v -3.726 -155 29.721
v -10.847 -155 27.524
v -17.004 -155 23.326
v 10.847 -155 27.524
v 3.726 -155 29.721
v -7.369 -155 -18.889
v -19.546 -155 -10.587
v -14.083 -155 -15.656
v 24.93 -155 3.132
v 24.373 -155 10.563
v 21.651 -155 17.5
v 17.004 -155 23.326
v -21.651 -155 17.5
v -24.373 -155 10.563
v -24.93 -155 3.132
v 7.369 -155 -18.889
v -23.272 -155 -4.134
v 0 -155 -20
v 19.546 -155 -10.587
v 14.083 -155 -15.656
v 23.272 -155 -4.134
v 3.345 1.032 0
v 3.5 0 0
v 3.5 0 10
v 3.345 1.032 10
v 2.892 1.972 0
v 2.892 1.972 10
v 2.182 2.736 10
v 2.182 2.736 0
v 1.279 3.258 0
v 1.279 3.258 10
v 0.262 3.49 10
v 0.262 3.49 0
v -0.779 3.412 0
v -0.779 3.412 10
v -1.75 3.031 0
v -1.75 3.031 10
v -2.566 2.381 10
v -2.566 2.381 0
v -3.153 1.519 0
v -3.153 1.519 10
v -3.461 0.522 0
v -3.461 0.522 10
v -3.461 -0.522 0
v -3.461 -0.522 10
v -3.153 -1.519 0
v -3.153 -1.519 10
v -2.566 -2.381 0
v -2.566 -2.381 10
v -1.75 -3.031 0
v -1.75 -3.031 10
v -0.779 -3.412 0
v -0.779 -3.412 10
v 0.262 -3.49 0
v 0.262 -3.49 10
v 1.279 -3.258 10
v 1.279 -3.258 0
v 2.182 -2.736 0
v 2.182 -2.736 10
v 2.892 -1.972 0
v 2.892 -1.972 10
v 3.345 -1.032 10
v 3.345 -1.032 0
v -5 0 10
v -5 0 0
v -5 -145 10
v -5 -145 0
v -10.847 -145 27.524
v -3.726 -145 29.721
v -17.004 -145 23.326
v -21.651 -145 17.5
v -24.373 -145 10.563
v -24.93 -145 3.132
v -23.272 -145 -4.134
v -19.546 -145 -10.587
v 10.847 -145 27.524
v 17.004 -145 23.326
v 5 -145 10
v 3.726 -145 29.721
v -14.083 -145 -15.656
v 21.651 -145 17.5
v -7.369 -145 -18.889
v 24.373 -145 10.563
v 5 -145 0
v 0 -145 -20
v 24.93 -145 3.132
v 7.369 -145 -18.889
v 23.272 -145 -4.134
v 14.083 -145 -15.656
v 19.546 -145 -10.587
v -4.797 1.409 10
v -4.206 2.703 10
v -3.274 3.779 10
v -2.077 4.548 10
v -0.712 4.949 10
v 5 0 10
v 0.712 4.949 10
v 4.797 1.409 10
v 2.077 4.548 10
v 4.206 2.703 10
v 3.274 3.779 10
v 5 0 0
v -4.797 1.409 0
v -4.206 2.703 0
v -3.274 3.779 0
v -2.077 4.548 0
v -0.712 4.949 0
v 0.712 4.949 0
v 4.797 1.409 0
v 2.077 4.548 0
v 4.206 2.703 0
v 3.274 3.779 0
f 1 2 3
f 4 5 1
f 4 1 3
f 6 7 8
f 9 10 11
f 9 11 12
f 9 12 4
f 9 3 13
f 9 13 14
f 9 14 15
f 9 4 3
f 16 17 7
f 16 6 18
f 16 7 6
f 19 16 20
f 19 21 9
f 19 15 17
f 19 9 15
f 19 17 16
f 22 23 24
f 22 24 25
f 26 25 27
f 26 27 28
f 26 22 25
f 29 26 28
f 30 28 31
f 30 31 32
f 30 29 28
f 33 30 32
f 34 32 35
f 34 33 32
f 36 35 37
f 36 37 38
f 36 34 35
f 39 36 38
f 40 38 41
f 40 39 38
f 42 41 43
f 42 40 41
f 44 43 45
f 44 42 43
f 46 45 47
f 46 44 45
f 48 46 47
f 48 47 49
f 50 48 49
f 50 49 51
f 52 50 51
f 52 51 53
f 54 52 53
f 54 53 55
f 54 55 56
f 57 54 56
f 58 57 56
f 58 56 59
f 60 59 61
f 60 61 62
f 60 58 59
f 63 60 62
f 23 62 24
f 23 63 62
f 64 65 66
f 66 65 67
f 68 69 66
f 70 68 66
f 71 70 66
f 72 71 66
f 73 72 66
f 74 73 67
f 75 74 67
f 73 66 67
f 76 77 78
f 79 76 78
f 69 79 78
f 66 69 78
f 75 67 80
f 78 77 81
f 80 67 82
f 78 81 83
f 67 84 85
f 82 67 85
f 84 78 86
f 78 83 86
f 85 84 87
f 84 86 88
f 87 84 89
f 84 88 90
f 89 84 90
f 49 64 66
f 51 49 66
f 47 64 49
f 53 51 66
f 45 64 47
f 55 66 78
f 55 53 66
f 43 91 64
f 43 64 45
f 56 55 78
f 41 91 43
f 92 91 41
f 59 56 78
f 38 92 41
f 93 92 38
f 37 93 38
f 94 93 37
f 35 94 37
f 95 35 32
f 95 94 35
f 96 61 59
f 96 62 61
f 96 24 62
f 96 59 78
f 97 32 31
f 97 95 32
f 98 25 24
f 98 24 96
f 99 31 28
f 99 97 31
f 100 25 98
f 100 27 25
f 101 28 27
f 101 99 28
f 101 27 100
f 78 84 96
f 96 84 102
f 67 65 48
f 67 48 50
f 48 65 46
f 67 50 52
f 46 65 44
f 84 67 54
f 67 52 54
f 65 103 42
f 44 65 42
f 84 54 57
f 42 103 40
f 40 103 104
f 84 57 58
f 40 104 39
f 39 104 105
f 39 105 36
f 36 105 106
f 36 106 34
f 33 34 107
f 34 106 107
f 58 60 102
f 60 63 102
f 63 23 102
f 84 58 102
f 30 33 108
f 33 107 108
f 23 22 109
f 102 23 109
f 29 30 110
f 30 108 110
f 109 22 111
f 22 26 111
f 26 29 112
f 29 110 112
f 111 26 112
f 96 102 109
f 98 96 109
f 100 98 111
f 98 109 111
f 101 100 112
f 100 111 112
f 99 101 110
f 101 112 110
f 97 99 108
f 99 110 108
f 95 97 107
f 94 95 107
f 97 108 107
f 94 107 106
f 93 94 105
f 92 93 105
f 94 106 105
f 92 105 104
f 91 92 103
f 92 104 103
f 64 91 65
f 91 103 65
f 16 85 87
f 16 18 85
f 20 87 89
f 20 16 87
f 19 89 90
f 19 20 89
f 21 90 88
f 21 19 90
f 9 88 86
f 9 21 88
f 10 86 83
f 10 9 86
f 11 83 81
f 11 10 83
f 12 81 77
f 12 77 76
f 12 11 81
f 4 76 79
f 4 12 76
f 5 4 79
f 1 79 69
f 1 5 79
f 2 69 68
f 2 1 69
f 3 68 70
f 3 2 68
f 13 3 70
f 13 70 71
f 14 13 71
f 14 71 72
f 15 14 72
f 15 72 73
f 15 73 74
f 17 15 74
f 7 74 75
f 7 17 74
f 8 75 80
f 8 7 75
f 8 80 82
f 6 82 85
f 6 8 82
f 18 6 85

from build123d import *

# Parameters (mm, degrees)
SKETCH1_R           = 3.5
BOSS_EXTRUDE1_DEPTH = 10
SKETCH2_R           = 25
BOSS_EXTRUDE2_DEPTH = 5


with BuildPart() as part:
    # Sketch1 → Boss-Extrude1 (new body)
    with BuildSketch(Plane.XY):
        with BuildLine():
            Line((-5, 0), (-5, -150))
            Line((-5, -150), (5, -150))
            Line((5, -150), (5, 0))
            ThreePointArc((5, 0), (0, 5), (-5, 0))
        make_face()
        Circle(SKETCH1_R, mode=Mode.SUBTRACT)
    extrude(amount=BOSS_EXTRUDE1_DEPTH)

    # Sketch2 → Boss-Extrude2 (add, symmetric)
    with BuildSketch(Plane.XZ.offset(150)):
        with Locations(Location((0, 5, 0), (0, 0, 270))):
            Circle(SKETCH2_R)
    extrude(amount=BOSS_EXTRUDE2_DEPTH, both=True)


solid = part.part
